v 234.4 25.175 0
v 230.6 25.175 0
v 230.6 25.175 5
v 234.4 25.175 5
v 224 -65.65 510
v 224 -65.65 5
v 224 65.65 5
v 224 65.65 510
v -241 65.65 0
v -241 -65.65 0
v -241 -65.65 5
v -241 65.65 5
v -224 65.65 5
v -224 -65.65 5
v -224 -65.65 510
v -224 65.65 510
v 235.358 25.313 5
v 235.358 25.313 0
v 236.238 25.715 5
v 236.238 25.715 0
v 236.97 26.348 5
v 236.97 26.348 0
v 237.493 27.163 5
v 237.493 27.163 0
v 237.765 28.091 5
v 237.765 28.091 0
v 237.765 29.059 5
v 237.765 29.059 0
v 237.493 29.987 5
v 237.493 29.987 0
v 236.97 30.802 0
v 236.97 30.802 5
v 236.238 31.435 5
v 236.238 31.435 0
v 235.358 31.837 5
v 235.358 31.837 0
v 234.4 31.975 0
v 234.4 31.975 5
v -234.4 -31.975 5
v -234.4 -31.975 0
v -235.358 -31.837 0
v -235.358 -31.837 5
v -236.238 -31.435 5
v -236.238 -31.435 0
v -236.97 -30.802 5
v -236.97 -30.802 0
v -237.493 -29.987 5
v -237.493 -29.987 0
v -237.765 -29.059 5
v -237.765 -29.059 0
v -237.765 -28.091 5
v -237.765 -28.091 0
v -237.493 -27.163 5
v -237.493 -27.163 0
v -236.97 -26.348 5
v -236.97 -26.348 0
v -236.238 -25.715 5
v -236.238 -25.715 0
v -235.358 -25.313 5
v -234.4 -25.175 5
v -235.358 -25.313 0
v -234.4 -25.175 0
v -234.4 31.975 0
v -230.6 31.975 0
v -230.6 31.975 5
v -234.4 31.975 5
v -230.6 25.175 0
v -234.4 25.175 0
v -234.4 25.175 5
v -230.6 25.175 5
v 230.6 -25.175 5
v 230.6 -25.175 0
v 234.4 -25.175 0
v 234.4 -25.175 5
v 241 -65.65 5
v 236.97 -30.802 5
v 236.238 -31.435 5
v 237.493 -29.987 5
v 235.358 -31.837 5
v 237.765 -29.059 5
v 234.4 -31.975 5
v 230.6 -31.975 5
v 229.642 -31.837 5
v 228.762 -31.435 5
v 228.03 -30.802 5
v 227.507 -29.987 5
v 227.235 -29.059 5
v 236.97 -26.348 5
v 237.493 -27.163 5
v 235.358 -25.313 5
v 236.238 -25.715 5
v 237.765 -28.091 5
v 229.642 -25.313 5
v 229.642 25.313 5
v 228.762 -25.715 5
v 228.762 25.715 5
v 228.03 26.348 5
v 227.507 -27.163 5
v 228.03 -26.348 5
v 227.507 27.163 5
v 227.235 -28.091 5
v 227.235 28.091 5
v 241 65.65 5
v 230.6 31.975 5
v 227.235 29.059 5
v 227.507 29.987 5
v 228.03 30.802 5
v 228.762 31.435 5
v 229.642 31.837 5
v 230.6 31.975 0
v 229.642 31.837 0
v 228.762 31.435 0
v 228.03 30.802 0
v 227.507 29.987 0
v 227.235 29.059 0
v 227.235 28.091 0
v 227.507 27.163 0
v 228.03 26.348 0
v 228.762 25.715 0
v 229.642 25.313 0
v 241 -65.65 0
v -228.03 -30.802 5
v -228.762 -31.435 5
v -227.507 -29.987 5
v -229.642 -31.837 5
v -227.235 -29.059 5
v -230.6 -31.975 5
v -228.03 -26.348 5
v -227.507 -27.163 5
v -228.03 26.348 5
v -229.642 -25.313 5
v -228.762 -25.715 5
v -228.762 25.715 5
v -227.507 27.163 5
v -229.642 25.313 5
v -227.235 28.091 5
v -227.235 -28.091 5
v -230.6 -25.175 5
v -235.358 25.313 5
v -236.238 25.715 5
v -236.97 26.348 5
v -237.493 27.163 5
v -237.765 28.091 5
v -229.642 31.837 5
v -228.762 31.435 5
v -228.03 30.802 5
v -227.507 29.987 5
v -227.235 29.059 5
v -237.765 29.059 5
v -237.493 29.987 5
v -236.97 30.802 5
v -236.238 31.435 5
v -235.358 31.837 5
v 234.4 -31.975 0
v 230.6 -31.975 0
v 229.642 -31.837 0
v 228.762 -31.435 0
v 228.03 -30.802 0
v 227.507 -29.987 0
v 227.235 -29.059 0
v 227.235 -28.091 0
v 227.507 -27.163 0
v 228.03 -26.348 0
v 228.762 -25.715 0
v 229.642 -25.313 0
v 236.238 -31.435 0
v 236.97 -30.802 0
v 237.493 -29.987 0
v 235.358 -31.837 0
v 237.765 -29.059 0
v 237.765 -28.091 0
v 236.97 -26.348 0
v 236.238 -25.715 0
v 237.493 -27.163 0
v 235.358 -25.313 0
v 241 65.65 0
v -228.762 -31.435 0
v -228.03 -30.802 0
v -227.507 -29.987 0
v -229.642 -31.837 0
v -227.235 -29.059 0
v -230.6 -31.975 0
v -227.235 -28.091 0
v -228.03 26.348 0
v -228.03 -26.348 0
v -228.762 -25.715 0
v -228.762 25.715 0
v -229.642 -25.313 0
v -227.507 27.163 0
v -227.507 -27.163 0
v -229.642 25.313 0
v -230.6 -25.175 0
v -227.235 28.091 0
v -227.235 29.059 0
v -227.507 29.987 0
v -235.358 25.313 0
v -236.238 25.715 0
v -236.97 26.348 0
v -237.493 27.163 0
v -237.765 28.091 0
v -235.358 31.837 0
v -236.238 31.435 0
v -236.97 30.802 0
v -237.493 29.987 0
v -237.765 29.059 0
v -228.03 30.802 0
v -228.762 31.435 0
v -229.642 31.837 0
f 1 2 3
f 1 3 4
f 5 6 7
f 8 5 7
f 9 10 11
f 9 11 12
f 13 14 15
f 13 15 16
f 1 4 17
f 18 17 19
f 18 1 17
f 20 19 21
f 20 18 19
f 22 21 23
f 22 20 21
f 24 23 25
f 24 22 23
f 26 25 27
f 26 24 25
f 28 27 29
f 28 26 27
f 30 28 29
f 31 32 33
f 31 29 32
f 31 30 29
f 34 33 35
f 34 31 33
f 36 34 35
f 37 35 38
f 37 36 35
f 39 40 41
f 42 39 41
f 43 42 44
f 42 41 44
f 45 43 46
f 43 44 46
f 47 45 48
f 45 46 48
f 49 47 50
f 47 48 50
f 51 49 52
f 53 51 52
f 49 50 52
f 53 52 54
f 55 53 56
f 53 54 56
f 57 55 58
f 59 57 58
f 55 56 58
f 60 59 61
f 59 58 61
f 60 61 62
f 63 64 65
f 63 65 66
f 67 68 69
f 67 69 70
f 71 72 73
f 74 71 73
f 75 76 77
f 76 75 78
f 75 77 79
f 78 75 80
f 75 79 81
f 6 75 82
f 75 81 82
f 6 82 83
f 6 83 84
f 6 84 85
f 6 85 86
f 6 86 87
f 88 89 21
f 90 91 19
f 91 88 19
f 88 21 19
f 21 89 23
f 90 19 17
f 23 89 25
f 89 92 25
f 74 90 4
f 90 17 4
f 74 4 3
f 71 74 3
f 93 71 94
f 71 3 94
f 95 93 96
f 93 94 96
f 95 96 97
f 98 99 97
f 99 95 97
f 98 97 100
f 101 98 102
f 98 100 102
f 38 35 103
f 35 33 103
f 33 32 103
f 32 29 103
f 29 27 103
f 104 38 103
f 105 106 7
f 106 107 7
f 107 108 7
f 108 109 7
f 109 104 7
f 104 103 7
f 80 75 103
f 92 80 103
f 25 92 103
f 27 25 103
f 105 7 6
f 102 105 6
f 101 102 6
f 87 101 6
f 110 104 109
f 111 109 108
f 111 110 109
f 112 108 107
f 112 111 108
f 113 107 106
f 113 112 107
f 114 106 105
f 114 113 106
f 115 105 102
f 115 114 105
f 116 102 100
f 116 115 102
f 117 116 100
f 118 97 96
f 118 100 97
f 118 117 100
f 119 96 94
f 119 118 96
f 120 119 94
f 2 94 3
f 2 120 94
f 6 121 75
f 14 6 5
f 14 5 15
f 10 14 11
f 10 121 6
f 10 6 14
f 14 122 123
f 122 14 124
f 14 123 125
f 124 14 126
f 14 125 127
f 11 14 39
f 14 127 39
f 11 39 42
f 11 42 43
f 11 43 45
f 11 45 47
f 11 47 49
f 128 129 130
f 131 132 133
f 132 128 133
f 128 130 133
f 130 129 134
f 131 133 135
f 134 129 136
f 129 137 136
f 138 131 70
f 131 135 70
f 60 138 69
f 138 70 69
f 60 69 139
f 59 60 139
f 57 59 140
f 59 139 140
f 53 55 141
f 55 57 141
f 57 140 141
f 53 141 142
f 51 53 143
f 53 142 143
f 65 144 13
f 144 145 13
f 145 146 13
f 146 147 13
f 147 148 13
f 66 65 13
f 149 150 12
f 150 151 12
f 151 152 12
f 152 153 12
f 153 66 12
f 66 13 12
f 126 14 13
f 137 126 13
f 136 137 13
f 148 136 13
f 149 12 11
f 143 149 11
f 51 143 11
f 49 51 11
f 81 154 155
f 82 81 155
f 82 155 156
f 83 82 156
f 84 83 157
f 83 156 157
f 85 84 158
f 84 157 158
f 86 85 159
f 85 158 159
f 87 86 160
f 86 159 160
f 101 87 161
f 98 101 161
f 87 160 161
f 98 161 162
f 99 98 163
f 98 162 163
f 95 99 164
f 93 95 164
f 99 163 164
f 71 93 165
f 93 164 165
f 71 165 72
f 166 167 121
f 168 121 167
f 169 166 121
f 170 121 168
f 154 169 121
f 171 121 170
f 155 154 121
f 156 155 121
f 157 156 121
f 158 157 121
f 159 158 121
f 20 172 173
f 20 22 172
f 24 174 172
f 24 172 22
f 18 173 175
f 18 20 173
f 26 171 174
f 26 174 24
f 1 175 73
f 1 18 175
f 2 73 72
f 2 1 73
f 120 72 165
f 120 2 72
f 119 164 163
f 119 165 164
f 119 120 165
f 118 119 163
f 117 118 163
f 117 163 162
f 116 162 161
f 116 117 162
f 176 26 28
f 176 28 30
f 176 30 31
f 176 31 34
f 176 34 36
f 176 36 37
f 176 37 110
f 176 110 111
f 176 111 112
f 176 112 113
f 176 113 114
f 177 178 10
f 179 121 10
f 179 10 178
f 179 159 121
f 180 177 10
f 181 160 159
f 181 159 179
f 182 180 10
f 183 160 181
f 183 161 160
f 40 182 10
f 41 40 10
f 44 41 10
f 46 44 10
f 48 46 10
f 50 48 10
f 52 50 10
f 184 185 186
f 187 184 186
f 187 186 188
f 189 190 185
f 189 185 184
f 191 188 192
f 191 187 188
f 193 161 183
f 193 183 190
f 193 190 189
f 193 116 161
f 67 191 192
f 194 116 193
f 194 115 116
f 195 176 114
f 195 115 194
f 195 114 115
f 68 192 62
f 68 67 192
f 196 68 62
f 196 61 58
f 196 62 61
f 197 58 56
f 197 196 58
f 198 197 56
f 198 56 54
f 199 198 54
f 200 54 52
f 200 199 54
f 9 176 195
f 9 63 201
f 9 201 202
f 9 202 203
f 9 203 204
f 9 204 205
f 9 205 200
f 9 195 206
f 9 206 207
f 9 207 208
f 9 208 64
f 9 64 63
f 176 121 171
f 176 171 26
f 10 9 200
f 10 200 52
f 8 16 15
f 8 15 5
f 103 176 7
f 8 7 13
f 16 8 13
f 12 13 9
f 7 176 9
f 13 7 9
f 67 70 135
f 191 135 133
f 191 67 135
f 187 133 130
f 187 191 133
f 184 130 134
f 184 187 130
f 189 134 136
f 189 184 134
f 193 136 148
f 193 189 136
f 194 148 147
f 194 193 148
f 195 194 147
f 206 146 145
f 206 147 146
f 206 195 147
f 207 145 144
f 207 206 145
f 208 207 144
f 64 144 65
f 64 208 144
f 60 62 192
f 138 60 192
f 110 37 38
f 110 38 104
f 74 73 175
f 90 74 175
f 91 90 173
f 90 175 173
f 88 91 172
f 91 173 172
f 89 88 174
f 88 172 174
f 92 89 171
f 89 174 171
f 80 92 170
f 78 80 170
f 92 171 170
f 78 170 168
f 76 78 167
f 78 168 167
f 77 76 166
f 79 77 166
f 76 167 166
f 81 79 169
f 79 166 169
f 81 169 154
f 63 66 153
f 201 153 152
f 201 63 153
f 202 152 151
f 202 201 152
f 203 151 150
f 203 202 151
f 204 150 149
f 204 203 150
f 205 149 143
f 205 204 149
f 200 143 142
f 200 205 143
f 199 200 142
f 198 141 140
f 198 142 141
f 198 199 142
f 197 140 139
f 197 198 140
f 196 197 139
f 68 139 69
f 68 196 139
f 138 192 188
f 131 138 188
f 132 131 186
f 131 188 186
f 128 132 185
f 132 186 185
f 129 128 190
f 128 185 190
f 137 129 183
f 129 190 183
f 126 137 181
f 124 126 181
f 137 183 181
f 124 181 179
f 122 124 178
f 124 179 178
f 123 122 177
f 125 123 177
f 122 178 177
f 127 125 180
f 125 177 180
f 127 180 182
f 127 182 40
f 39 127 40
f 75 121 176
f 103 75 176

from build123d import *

# Parameters (mm, degrees)
SKETCH1_W           = 448
SKETCH1_H           = 131.3
BOSS_EXTRUDE1_DEPTH = 510
SKETCH2_W           = 482
SKETCH2_H           = 131.3
BOSS_EXTRUDE2_DEPTH = 5
CUT_EXTRUDE1_DEPTH  = 511


with BuildPart() as part:
    # Sketch1 → Boss-Extrude1 (new body)
    with BuildSketch(Plane.XY):
        Rectangle(SKETCH1_W, SKETCH1_H)
    extrude(amount=BOSS_EXTRUDE1_DEPTH)

    # Sketch2 → Boss-Extrude2 (add)
    with BuildSketch(Plane(origin=(0, 0, 0), x_dir=(-1, 0, 0), z_dir=(0, 0, -1))):
        Rectangle(SKETCH2_W, SKETCH2_H)
    extrude(amount=-BOSS_EXTRUDE2_DEPTH)

    # Sketch3 → Cut-Extrude1 (cut, through all)
    with BuildSketch(Plane(origin=(0, 0, 0), x_dir=(-1, 0, 0), z_dir=(0, 0, -1))):
        with BuildLine():
            Line((-234.4, 31.975), (-230.6, 31.975))
            ThreePointArc((-230.6, 31.975), (-227.2, 28.575), (-230.6, 25.175))
            Line((-230.6, 25.175), (-234.4, 25.175))
            ThreePointArc((-234.4, 25.175), (-237.8, 28.575), (-234.4, 31.975))
        make_face()
        with BuildLine():
            Line((234.4, 25.175), (230.6, 25.175))
            ThreePointArc((230.6, 25.175), (227.2, 28.575), (230.6, 31.975))
            Line((230.6, 31.975), (234.4, 31.975))
            ThreePointArc((234.4, 31.975), (237.8, 28.575), (234.4, 25.175))
        make_face()
    cut_extrude1 = extrude(amount=-CUT_EXTRUDE1_DEPTH, mode=Mode.SUBTRACT)

    # Mirror1: Cut-Extrude1 across plane
    add(cut_extrude1.mirror(Plane.ZX), mode=Mode.SUBTRACT)


solid = part.part
